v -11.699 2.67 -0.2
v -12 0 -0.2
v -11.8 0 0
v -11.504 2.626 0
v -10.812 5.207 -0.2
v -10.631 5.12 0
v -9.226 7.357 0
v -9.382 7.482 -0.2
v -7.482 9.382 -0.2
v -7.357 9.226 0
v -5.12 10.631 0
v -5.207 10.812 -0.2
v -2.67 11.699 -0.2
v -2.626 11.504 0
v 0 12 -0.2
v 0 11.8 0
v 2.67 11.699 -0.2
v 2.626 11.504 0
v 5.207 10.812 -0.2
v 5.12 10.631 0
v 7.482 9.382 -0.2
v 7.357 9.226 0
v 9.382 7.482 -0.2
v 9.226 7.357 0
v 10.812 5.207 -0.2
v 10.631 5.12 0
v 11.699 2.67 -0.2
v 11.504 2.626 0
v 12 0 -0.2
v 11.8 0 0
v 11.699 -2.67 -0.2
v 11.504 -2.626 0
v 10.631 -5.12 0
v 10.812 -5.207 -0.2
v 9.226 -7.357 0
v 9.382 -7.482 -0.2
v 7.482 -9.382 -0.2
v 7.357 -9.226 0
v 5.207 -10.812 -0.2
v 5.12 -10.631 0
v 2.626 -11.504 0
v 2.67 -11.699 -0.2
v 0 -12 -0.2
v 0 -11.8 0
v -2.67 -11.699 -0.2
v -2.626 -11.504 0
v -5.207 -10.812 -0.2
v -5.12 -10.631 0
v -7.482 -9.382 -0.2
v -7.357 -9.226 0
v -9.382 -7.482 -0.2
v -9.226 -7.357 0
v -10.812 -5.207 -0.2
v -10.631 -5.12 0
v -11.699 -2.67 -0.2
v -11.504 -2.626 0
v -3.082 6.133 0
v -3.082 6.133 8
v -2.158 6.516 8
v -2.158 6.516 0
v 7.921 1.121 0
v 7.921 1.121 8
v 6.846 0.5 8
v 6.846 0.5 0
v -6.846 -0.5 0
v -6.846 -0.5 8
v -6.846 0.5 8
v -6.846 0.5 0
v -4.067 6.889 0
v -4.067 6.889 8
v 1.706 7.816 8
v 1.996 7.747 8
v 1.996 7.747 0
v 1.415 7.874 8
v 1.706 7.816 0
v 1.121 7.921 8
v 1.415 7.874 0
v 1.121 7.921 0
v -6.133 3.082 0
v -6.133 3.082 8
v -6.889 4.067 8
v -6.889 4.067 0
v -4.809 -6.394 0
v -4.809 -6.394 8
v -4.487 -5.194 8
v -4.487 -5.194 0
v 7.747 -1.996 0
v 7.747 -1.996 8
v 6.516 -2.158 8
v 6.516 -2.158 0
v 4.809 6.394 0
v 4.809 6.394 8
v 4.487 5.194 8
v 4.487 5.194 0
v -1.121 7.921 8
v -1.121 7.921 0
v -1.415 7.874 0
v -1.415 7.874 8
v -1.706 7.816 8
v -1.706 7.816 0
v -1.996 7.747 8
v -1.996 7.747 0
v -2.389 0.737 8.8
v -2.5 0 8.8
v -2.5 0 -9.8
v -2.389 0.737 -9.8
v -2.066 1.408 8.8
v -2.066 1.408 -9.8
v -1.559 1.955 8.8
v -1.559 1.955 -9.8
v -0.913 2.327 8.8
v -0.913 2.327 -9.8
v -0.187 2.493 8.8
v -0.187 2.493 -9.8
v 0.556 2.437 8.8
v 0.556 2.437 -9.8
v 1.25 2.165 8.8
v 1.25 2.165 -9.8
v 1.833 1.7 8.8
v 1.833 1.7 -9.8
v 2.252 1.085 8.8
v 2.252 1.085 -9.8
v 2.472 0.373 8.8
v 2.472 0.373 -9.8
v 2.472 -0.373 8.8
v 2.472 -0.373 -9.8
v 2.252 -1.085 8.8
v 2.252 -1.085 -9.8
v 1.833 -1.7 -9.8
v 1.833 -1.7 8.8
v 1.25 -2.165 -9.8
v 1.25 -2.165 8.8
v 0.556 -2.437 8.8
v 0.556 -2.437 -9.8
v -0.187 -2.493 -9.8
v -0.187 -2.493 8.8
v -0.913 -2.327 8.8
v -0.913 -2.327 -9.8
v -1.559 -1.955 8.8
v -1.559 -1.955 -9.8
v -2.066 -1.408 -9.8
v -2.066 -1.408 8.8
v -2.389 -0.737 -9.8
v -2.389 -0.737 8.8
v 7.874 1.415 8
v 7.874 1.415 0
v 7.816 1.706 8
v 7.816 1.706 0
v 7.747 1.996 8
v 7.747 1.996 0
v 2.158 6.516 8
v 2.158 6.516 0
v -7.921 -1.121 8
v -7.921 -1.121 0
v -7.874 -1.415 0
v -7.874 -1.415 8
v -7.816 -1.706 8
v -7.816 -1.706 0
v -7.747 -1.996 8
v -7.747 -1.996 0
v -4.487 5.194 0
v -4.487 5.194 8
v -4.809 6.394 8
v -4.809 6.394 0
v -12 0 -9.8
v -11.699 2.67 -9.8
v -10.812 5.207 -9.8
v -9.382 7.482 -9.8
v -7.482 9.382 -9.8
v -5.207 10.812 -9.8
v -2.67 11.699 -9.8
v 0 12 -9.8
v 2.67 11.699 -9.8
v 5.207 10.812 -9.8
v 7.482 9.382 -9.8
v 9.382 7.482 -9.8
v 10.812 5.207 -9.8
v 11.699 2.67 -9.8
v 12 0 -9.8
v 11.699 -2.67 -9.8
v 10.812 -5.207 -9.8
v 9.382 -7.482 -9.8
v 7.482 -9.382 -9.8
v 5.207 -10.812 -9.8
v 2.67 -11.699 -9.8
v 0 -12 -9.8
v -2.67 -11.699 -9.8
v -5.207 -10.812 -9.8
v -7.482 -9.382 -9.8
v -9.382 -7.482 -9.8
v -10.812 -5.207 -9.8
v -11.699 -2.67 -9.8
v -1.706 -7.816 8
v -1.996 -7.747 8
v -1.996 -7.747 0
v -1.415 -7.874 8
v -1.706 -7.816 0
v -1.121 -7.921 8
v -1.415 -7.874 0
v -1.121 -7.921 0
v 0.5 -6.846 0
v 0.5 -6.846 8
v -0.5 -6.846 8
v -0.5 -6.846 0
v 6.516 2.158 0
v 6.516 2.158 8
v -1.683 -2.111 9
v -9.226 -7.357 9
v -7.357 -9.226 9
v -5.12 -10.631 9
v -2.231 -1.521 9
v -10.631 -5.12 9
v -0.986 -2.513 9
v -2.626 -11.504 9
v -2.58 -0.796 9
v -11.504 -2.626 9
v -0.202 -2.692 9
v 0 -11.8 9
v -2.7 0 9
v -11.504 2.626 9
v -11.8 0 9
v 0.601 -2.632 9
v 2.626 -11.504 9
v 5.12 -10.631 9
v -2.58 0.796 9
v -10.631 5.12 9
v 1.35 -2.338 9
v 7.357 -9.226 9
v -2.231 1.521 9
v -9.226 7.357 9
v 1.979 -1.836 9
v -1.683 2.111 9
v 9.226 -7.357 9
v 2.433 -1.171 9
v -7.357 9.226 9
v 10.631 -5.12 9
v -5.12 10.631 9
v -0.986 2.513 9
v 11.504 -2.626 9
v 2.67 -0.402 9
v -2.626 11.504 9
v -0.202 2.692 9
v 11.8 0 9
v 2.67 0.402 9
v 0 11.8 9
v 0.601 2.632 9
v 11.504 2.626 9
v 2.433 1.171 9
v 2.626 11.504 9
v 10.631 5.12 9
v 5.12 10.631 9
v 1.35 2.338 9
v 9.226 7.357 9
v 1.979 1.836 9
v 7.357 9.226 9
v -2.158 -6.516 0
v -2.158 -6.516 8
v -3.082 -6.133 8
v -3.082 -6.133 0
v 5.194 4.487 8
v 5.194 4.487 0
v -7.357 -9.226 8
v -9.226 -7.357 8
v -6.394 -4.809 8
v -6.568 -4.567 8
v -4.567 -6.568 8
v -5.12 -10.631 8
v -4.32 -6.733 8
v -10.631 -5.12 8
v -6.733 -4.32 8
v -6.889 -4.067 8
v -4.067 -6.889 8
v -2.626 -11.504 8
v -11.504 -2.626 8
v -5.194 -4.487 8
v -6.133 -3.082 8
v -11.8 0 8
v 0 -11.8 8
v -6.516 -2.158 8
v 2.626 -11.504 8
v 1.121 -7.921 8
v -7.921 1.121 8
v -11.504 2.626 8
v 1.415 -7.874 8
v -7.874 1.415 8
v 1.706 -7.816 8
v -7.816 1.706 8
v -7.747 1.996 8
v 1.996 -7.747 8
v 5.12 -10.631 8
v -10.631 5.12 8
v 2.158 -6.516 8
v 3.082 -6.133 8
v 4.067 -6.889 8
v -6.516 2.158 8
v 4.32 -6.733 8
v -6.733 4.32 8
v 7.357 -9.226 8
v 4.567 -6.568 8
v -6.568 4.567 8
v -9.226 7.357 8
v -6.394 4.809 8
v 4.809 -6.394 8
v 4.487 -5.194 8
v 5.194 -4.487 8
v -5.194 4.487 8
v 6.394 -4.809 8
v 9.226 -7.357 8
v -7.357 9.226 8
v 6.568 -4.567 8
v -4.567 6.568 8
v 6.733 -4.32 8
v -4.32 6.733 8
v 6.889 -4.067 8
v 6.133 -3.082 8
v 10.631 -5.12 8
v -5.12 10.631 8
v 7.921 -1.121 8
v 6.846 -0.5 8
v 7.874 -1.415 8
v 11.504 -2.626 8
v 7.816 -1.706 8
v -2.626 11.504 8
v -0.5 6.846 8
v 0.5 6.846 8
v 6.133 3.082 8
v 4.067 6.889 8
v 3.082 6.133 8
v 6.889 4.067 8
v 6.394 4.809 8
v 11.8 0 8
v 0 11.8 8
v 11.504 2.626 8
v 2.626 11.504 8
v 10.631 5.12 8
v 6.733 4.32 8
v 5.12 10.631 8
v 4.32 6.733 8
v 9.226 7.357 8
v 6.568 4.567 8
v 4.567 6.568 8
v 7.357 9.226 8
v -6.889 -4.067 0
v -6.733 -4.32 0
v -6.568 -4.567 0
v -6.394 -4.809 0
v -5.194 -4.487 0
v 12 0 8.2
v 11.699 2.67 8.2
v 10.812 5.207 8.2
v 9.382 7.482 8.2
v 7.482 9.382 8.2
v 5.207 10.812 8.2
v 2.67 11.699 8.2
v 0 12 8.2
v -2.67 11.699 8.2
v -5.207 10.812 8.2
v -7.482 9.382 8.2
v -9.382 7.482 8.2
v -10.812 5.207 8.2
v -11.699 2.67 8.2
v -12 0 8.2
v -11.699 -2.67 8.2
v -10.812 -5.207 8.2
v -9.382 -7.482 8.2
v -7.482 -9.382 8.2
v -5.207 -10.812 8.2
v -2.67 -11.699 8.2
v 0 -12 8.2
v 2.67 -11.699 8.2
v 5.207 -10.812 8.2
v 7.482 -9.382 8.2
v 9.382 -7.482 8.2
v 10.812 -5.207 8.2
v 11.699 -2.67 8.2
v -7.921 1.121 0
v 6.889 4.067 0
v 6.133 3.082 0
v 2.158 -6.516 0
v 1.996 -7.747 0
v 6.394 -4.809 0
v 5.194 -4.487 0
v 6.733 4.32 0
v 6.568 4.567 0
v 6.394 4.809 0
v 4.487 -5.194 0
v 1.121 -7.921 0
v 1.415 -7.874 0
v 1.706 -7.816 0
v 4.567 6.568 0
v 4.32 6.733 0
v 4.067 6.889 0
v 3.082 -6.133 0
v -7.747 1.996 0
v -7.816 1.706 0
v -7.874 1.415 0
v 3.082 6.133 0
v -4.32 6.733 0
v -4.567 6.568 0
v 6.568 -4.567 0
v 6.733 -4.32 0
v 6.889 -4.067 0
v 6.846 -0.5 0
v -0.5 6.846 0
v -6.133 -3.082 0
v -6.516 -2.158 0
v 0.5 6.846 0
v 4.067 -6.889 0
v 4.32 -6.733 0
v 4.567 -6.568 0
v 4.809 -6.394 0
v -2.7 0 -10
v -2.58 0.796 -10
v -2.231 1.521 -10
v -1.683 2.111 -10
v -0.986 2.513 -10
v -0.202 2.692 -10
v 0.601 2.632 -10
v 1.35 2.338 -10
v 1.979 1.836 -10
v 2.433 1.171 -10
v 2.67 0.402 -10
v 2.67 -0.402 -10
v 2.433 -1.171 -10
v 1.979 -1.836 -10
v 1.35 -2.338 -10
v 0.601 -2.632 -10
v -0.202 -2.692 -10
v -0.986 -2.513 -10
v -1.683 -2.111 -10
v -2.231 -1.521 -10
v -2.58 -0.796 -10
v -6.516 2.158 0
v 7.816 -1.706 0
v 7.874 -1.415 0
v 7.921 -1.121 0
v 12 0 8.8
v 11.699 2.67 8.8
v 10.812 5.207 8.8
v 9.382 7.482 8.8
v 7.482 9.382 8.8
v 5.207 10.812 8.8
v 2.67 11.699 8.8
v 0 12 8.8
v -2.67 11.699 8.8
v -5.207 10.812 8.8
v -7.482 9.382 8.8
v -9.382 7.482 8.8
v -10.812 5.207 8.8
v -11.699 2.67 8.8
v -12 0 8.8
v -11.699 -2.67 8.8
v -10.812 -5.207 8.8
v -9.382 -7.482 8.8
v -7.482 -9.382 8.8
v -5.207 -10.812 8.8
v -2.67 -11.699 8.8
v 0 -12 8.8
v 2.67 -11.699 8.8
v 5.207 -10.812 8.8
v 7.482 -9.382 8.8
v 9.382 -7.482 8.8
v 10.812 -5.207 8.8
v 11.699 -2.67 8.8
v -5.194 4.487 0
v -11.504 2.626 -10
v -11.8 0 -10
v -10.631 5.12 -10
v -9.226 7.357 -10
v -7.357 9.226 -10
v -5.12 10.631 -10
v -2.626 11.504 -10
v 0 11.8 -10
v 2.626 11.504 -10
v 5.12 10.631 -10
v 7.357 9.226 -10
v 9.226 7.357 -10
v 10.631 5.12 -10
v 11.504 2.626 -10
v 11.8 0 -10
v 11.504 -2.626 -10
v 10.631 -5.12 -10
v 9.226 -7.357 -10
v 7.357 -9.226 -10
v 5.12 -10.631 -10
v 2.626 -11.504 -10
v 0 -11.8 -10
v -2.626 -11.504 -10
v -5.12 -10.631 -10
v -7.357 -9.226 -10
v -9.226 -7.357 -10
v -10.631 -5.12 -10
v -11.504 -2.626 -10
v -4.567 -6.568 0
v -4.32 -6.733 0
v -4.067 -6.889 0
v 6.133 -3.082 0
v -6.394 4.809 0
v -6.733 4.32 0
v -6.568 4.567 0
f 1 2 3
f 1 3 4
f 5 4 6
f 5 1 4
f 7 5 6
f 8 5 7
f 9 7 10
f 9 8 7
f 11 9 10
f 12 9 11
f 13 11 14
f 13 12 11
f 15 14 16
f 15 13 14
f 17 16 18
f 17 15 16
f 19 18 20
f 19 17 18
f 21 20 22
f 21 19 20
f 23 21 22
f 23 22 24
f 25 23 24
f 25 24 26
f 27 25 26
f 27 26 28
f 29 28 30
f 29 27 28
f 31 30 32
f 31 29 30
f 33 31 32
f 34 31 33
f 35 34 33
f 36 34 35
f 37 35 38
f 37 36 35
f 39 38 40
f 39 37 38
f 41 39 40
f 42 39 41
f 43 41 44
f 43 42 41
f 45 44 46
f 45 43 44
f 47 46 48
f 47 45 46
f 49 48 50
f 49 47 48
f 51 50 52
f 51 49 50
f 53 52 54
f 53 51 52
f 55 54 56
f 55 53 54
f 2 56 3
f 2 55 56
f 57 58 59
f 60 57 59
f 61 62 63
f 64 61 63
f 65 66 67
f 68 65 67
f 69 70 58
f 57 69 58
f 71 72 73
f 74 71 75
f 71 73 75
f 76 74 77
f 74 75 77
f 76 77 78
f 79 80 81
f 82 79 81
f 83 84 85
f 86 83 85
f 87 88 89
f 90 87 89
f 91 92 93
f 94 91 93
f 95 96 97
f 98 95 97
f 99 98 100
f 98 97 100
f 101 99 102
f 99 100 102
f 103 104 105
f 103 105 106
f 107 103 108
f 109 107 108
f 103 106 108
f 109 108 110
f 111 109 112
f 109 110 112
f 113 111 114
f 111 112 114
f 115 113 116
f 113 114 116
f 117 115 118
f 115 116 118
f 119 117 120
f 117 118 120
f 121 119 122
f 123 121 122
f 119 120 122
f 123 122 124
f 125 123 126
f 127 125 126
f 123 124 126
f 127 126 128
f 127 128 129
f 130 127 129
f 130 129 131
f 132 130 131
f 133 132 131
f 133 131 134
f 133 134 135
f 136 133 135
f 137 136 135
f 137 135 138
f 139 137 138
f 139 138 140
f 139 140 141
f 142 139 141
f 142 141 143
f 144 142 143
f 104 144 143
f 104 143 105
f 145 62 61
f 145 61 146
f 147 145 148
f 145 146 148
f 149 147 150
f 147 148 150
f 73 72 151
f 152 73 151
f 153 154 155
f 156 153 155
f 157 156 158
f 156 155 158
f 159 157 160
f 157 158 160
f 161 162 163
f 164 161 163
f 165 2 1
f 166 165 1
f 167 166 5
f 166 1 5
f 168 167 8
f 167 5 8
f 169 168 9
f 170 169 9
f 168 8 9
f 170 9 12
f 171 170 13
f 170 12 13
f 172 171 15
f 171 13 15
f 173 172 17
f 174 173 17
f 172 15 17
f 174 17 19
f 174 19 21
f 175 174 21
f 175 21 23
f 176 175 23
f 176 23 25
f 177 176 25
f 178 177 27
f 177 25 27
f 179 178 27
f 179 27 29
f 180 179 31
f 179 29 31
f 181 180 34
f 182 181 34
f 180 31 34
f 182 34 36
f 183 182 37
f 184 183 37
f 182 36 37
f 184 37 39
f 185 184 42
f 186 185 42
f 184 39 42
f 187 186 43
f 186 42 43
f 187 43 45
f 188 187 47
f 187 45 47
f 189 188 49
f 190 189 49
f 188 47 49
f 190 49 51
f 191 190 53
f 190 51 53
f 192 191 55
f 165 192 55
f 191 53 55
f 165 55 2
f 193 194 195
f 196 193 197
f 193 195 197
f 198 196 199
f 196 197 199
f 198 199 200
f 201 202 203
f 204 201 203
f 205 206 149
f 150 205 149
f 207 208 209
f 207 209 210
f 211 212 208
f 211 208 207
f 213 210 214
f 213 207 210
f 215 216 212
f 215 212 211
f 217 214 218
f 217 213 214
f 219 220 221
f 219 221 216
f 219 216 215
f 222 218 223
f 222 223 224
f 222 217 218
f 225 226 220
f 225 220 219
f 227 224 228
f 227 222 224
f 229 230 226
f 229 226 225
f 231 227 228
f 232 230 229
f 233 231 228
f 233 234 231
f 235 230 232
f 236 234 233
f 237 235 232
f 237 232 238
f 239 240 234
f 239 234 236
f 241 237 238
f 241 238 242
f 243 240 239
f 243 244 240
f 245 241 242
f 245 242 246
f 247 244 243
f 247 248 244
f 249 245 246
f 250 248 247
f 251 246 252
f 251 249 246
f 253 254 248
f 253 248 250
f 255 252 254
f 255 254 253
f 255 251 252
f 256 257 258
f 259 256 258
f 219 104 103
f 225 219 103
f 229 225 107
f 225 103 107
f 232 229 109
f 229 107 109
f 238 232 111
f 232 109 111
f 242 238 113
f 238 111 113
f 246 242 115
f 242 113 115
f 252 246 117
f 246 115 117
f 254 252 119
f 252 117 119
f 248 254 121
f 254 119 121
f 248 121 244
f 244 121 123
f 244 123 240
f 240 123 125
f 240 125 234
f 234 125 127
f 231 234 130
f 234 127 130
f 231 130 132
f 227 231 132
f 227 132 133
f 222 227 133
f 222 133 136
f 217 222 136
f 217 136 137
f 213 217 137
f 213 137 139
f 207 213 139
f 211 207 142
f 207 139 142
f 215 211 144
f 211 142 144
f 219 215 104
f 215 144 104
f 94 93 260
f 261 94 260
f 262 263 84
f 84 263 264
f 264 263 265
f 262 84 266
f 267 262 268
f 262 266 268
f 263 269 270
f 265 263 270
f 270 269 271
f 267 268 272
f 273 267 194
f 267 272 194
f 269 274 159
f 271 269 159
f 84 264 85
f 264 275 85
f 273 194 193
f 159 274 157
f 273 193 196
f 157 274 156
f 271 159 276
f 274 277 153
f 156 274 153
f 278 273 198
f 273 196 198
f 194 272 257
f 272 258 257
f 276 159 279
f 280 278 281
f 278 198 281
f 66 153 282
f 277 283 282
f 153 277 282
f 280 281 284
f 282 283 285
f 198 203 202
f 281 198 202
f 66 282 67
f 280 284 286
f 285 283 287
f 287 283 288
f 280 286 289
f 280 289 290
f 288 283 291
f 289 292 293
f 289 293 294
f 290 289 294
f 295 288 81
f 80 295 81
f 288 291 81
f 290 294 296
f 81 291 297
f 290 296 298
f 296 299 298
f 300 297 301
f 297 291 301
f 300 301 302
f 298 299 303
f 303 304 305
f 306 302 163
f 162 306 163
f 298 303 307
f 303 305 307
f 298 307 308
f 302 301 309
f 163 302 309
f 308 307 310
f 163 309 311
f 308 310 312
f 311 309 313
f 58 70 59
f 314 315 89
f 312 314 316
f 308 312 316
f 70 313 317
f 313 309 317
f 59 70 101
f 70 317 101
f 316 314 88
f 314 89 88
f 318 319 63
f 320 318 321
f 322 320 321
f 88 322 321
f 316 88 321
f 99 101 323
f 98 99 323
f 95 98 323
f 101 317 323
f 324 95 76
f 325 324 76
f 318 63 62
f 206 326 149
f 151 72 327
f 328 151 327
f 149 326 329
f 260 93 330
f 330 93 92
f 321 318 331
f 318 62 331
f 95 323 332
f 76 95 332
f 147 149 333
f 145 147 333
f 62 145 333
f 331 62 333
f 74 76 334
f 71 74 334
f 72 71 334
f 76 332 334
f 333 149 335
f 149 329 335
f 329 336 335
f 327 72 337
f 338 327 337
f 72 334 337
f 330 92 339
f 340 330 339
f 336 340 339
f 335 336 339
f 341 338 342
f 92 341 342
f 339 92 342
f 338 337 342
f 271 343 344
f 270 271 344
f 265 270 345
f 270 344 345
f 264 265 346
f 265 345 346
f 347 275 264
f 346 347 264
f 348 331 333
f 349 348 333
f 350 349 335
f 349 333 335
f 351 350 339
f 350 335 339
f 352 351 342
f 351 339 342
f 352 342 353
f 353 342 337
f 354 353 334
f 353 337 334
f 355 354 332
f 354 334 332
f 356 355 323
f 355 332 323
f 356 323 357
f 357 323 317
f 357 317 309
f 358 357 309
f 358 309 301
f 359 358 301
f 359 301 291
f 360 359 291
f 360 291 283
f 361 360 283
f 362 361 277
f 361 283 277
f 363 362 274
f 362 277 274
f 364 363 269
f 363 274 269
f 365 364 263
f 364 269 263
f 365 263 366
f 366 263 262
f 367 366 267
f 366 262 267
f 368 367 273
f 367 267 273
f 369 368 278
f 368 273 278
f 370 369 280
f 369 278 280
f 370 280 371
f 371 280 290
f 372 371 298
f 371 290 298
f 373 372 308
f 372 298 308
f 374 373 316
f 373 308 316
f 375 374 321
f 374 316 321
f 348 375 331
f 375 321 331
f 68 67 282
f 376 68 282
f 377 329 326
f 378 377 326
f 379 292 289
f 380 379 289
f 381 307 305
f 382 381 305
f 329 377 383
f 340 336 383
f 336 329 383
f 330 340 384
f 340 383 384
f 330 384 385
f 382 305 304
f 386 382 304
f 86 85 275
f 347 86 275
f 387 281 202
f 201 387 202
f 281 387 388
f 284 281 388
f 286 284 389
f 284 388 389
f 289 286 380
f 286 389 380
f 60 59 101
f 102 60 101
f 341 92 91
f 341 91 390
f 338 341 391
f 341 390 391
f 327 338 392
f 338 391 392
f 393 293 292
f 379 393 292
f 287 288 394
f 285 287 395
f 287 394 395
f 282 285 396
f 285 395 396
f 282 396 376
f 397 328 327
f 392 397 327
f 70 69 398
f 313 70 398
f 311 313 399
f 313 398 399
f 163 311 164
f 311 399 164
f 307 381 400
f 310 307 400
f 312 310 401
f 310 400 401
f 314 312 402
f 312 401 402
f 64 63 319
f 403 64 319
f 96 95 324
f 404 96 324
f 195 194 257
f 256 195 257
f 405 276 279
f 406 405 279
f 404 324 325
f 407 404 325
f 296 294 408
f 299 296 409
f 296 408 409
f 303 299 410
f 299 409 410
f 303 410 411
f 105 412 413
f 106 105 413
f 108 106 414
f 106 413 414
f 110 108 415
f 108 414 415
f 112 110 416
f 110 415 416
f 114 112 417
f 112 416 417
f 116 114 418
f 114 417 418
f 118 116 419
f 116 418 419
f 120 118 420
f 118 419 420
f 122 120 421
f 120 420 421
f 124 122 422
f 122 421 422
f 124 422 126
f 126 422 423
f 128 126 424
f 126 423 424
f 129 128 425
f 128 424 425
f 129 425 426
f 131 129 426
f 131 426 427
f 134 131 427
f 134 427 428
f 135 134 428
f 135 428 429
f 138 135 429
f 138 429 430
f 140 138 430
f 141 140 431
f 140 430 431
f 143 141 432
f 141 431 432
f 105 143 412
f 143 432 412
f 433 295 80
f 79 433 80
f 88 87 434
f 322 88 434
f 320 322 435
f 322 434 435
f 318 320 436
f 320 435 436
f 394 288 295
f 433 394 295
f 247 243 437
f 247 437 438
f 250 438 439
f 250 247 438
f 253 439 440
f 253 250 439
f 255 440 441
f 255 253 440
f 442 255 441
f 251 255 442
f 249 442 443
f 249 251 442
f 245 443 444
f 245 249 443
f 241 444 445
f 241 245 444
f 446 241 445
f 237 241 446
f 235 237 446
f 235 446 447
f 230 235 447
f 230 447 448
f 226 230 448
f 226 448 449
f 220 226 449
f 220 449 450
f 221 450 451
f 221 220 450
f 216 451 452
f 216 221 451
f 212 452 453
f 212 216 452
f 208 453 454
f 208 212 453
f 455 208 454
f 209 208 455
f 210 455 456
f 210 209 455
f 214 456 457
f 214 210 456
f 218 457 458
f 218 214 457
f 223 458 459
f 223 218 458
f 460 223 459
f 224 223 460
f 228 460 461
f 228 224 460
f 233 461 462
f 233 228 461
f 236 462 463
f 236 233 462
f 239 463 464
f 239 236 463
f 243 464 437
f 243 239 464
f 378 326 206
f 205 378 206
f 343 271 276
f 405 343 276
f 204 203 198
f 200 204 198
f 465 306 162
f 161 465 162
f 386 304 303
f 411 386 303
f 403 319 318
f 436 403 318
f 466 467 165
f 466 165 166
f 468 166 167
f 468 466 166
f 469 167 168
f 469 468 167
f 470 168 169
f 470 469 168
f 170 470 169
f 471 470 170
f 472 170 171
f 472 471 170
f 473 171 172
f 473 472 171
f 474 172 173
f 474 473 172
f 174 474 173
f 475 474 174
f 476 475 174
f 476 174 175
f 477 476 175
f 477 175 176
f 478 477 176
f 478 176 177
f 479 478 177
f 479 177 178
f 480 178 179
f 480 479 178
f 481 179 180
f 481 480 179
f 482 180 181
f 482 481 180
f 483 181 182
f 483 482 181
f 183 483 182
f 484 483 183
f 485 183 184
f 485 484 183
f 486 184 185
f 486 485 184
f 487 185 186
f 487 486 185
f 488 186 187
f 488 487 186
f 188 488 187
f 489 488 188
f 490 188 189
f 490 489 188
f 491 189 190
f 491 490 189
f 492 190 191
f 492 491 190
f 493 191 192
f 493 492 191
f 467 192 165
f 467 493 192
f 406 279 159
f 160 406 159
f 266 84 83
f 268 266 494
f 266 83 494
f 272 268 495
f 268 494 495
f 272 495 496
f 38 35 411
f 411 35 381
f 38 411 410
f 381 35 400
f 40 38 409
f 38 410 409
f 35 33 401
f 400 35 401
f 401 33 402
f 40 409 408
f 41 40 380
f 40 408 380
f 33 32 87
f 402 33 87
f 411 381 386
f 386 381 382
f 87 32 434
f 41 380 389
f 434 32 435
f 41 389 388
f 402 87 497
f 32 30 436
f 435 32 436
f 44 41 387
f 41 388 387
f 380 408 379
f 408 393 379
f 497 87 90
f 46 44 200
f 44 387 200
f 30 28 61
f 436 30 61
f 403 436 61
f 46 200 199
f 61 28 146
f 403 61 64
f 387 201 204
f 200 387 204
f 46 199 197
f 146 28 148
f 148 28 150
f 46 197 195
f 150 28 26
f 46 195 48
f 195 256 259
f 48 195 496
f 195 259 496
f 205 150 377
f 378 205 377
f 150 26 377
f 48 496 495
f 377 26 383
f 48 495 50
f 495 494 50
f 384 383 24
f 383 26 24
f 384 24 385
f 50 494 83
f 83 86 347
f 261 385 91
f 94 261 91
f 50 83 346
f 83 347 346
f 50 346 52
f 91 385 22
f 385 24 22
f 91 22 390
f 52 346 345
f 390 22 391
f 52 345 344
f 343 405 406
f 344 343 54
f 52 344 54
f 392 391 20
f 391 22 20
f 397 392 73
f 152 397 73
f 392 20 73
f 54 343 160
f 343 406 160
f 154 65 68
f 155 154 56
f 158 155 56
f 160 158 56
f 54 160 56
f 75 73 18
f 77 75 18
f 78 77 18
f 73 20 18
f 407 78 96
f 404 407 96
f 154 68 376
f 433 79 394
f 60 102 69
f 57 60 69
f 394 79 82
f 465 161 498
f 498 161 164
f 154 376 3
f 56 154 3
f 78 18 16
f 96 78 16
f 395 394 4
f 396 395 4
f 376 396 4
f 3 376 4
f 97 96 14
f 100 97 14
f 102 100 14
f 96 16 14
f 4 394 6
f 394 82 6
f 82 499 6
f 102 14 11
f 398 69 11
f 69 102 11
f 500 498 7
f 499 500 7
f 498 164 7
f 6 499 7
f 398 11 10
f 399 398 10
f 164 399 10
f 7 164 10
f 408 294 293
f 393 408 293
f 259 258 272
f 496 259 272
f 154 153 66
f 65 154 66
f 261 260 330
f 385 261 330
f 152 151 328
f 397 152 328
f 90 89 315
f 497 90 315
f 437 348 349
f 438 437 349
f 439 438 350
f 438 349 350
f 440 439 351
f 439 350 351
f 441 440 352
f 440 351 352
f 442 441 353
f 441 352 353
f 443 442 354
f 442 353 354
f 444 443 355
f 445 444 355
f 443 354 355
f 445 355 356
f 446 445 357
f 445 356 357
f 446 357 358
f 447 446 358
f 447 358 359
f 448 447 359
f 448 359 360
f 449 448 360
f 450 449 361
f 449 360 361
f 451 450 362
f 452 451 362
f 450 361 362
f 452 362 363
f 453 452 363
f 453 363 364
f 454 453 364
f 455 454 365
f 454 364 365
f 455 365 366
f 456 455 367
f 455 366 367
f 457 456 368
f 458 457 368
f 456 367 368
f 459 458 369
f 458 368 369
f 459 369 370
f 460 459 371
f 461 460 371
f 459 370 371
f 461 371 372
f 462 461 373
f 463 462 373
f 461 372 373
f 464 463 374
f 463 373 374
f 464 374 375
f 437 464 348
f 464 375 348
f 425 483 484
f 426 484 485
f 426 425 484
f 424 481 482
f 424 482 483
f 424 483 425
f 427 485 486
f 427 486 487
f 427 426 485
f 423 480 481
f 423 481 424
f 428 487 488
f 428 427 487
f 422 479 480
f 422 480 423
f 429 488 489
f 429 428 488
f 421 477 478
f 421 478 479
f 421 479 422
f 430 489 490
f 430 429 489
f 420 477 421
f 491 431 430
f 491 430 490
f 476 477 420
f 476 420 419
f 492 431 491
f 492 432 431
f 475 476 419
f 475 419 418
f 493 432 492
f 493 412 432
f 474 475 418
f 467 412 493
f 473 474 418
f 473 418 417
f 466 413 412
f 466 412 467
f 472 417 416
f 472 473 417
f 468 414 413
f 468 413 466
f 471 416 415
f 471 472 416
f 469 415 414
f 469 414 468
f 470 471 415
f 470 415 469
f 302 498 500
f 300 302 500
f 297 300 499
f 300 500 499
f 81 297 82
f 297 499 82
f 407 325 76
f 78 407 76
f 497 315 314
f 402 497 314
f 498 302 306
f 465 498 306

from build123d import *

# Parameters (mm, degrees)
ESQUISSE1_R                  = 8
BOSS_EXTRU_1_DEPTH           = 8
ENL_V_MAT_EXTRU_1_DEPTH      = 9
R_P_TITION_CIRCULAIRE1_COUNT = 16
ESQUISSE3_R                  = 12
BOSS_EXTRU_2_DEPTH           = 10
ESQUISSE4_R                  = 12
BOSS_EXTRU_3_DEPTH           = 1
CHANFREIN1_SIZE              = 0.2
ESQUISSE5_R                  = 2.5
ENL_V_MAT_EXTRU_2_DEPTH      = 20
CHANFREIN2_SIZE              = 0.2


with BuildPart() as part:
    # Esquisse1 → Boss.-Extru.1 (new body)
    with BuildSketch(Plane.XY):
        Circle(ESQUISSE1_R)
    extrude(amount=BOSS_EXTRU_1_DEPTH)

    # Esquisse2 → Enlèv. mat.-Extru.1 (cut, through all)
    with BuildSketch(Plane.XY.offset(8)):
        with BuildLine():
            Line((-1.120772376, 7.921102782), (-0.5, 6.845893487))
            Line((-0.5, 6.845893487), (0.5, 6.845893487))
            Line((0.5, 6.845893487), (1.120772376, 7.921102782))
            ThreePointArc((1.120772376, 7.921102782), (0, 8), (-1.120772376, 7.921102782))
        make_face()
    enl_v_mat_extru_1 = extrude(amount=-ENL_V_MAT_EXTRU_1_DEPTH, mode=Mode.SUBTRACT)

    # Répétition circulaire1: Enlèv. mat.-Extru.1 ×16 about axis
    r_p_tition_circulaire1_axis = Axis((0, 0, 0), (0, 0, 1))
    for i in range(1, R_P_TITION_CIRCULAIRE1_COUNT):
        add(enl_v_mat_extru_1.rotate(r_p_tition_circulaire1_axis, i * 360 / R_P_TITION_CIRCULAIRE1_COUNT), mode=Mode.SUBTRACT)

    # Esquisse3 → Boss.-Extru.2 (add)
    with BuildSketch(Plane(origin=(0, 0, 0), x_dir=(-1, 0, 0), z_dir=(0, 0, -1))):
        Circle(ESQUISSE3_R)
    extrude(amount=BOSS_EXTRU_2_DEPTH)

    # Esquisse4 → Boss.-Extru.3 (add)
    with BuildSketch(Plane.XY.offset(8)):
        Circle(ESQUISSE4_R)
    extrude(amount=BOSS_EXTRU_3_DEPTH)

    # Chanfrein1
    chanfrein1_edges = [part.edges().sort_by_distance(p)[0] for p in [
        (12, 0, 0),
        (12, 0, -10),
        (-12, 0, 8),
        (-12, 0, 9),
    ]]
    chamfer(chanfrein1_edges, length=CHANFREIN1_SIZE)

    # Esquisse5 → Enlèv. mat.-Extru.2 (cut, through all)
    with BuildSketch(Plane(origin=(0, 0, -10), x_dir=(-1, 0, 0), z_dir=(0, 0, -1))):
        Circle(ESQUISSE5_R)
    extrude(amount=-ENL_V_MAT_EXTRU_2_DEPTH, mode=Mode.SUBTRACT)

    # Chanfrein2
    chanfrein2_edges = [part.edges().sort_by_distance(p)[0] for p in [
        (2.5, 0, 9),
        (2.5, 0, -10),
    ]]
    chamfer(chanfrein2_edges, length=CHANFREIN2_SIZE)


solid = part.part
